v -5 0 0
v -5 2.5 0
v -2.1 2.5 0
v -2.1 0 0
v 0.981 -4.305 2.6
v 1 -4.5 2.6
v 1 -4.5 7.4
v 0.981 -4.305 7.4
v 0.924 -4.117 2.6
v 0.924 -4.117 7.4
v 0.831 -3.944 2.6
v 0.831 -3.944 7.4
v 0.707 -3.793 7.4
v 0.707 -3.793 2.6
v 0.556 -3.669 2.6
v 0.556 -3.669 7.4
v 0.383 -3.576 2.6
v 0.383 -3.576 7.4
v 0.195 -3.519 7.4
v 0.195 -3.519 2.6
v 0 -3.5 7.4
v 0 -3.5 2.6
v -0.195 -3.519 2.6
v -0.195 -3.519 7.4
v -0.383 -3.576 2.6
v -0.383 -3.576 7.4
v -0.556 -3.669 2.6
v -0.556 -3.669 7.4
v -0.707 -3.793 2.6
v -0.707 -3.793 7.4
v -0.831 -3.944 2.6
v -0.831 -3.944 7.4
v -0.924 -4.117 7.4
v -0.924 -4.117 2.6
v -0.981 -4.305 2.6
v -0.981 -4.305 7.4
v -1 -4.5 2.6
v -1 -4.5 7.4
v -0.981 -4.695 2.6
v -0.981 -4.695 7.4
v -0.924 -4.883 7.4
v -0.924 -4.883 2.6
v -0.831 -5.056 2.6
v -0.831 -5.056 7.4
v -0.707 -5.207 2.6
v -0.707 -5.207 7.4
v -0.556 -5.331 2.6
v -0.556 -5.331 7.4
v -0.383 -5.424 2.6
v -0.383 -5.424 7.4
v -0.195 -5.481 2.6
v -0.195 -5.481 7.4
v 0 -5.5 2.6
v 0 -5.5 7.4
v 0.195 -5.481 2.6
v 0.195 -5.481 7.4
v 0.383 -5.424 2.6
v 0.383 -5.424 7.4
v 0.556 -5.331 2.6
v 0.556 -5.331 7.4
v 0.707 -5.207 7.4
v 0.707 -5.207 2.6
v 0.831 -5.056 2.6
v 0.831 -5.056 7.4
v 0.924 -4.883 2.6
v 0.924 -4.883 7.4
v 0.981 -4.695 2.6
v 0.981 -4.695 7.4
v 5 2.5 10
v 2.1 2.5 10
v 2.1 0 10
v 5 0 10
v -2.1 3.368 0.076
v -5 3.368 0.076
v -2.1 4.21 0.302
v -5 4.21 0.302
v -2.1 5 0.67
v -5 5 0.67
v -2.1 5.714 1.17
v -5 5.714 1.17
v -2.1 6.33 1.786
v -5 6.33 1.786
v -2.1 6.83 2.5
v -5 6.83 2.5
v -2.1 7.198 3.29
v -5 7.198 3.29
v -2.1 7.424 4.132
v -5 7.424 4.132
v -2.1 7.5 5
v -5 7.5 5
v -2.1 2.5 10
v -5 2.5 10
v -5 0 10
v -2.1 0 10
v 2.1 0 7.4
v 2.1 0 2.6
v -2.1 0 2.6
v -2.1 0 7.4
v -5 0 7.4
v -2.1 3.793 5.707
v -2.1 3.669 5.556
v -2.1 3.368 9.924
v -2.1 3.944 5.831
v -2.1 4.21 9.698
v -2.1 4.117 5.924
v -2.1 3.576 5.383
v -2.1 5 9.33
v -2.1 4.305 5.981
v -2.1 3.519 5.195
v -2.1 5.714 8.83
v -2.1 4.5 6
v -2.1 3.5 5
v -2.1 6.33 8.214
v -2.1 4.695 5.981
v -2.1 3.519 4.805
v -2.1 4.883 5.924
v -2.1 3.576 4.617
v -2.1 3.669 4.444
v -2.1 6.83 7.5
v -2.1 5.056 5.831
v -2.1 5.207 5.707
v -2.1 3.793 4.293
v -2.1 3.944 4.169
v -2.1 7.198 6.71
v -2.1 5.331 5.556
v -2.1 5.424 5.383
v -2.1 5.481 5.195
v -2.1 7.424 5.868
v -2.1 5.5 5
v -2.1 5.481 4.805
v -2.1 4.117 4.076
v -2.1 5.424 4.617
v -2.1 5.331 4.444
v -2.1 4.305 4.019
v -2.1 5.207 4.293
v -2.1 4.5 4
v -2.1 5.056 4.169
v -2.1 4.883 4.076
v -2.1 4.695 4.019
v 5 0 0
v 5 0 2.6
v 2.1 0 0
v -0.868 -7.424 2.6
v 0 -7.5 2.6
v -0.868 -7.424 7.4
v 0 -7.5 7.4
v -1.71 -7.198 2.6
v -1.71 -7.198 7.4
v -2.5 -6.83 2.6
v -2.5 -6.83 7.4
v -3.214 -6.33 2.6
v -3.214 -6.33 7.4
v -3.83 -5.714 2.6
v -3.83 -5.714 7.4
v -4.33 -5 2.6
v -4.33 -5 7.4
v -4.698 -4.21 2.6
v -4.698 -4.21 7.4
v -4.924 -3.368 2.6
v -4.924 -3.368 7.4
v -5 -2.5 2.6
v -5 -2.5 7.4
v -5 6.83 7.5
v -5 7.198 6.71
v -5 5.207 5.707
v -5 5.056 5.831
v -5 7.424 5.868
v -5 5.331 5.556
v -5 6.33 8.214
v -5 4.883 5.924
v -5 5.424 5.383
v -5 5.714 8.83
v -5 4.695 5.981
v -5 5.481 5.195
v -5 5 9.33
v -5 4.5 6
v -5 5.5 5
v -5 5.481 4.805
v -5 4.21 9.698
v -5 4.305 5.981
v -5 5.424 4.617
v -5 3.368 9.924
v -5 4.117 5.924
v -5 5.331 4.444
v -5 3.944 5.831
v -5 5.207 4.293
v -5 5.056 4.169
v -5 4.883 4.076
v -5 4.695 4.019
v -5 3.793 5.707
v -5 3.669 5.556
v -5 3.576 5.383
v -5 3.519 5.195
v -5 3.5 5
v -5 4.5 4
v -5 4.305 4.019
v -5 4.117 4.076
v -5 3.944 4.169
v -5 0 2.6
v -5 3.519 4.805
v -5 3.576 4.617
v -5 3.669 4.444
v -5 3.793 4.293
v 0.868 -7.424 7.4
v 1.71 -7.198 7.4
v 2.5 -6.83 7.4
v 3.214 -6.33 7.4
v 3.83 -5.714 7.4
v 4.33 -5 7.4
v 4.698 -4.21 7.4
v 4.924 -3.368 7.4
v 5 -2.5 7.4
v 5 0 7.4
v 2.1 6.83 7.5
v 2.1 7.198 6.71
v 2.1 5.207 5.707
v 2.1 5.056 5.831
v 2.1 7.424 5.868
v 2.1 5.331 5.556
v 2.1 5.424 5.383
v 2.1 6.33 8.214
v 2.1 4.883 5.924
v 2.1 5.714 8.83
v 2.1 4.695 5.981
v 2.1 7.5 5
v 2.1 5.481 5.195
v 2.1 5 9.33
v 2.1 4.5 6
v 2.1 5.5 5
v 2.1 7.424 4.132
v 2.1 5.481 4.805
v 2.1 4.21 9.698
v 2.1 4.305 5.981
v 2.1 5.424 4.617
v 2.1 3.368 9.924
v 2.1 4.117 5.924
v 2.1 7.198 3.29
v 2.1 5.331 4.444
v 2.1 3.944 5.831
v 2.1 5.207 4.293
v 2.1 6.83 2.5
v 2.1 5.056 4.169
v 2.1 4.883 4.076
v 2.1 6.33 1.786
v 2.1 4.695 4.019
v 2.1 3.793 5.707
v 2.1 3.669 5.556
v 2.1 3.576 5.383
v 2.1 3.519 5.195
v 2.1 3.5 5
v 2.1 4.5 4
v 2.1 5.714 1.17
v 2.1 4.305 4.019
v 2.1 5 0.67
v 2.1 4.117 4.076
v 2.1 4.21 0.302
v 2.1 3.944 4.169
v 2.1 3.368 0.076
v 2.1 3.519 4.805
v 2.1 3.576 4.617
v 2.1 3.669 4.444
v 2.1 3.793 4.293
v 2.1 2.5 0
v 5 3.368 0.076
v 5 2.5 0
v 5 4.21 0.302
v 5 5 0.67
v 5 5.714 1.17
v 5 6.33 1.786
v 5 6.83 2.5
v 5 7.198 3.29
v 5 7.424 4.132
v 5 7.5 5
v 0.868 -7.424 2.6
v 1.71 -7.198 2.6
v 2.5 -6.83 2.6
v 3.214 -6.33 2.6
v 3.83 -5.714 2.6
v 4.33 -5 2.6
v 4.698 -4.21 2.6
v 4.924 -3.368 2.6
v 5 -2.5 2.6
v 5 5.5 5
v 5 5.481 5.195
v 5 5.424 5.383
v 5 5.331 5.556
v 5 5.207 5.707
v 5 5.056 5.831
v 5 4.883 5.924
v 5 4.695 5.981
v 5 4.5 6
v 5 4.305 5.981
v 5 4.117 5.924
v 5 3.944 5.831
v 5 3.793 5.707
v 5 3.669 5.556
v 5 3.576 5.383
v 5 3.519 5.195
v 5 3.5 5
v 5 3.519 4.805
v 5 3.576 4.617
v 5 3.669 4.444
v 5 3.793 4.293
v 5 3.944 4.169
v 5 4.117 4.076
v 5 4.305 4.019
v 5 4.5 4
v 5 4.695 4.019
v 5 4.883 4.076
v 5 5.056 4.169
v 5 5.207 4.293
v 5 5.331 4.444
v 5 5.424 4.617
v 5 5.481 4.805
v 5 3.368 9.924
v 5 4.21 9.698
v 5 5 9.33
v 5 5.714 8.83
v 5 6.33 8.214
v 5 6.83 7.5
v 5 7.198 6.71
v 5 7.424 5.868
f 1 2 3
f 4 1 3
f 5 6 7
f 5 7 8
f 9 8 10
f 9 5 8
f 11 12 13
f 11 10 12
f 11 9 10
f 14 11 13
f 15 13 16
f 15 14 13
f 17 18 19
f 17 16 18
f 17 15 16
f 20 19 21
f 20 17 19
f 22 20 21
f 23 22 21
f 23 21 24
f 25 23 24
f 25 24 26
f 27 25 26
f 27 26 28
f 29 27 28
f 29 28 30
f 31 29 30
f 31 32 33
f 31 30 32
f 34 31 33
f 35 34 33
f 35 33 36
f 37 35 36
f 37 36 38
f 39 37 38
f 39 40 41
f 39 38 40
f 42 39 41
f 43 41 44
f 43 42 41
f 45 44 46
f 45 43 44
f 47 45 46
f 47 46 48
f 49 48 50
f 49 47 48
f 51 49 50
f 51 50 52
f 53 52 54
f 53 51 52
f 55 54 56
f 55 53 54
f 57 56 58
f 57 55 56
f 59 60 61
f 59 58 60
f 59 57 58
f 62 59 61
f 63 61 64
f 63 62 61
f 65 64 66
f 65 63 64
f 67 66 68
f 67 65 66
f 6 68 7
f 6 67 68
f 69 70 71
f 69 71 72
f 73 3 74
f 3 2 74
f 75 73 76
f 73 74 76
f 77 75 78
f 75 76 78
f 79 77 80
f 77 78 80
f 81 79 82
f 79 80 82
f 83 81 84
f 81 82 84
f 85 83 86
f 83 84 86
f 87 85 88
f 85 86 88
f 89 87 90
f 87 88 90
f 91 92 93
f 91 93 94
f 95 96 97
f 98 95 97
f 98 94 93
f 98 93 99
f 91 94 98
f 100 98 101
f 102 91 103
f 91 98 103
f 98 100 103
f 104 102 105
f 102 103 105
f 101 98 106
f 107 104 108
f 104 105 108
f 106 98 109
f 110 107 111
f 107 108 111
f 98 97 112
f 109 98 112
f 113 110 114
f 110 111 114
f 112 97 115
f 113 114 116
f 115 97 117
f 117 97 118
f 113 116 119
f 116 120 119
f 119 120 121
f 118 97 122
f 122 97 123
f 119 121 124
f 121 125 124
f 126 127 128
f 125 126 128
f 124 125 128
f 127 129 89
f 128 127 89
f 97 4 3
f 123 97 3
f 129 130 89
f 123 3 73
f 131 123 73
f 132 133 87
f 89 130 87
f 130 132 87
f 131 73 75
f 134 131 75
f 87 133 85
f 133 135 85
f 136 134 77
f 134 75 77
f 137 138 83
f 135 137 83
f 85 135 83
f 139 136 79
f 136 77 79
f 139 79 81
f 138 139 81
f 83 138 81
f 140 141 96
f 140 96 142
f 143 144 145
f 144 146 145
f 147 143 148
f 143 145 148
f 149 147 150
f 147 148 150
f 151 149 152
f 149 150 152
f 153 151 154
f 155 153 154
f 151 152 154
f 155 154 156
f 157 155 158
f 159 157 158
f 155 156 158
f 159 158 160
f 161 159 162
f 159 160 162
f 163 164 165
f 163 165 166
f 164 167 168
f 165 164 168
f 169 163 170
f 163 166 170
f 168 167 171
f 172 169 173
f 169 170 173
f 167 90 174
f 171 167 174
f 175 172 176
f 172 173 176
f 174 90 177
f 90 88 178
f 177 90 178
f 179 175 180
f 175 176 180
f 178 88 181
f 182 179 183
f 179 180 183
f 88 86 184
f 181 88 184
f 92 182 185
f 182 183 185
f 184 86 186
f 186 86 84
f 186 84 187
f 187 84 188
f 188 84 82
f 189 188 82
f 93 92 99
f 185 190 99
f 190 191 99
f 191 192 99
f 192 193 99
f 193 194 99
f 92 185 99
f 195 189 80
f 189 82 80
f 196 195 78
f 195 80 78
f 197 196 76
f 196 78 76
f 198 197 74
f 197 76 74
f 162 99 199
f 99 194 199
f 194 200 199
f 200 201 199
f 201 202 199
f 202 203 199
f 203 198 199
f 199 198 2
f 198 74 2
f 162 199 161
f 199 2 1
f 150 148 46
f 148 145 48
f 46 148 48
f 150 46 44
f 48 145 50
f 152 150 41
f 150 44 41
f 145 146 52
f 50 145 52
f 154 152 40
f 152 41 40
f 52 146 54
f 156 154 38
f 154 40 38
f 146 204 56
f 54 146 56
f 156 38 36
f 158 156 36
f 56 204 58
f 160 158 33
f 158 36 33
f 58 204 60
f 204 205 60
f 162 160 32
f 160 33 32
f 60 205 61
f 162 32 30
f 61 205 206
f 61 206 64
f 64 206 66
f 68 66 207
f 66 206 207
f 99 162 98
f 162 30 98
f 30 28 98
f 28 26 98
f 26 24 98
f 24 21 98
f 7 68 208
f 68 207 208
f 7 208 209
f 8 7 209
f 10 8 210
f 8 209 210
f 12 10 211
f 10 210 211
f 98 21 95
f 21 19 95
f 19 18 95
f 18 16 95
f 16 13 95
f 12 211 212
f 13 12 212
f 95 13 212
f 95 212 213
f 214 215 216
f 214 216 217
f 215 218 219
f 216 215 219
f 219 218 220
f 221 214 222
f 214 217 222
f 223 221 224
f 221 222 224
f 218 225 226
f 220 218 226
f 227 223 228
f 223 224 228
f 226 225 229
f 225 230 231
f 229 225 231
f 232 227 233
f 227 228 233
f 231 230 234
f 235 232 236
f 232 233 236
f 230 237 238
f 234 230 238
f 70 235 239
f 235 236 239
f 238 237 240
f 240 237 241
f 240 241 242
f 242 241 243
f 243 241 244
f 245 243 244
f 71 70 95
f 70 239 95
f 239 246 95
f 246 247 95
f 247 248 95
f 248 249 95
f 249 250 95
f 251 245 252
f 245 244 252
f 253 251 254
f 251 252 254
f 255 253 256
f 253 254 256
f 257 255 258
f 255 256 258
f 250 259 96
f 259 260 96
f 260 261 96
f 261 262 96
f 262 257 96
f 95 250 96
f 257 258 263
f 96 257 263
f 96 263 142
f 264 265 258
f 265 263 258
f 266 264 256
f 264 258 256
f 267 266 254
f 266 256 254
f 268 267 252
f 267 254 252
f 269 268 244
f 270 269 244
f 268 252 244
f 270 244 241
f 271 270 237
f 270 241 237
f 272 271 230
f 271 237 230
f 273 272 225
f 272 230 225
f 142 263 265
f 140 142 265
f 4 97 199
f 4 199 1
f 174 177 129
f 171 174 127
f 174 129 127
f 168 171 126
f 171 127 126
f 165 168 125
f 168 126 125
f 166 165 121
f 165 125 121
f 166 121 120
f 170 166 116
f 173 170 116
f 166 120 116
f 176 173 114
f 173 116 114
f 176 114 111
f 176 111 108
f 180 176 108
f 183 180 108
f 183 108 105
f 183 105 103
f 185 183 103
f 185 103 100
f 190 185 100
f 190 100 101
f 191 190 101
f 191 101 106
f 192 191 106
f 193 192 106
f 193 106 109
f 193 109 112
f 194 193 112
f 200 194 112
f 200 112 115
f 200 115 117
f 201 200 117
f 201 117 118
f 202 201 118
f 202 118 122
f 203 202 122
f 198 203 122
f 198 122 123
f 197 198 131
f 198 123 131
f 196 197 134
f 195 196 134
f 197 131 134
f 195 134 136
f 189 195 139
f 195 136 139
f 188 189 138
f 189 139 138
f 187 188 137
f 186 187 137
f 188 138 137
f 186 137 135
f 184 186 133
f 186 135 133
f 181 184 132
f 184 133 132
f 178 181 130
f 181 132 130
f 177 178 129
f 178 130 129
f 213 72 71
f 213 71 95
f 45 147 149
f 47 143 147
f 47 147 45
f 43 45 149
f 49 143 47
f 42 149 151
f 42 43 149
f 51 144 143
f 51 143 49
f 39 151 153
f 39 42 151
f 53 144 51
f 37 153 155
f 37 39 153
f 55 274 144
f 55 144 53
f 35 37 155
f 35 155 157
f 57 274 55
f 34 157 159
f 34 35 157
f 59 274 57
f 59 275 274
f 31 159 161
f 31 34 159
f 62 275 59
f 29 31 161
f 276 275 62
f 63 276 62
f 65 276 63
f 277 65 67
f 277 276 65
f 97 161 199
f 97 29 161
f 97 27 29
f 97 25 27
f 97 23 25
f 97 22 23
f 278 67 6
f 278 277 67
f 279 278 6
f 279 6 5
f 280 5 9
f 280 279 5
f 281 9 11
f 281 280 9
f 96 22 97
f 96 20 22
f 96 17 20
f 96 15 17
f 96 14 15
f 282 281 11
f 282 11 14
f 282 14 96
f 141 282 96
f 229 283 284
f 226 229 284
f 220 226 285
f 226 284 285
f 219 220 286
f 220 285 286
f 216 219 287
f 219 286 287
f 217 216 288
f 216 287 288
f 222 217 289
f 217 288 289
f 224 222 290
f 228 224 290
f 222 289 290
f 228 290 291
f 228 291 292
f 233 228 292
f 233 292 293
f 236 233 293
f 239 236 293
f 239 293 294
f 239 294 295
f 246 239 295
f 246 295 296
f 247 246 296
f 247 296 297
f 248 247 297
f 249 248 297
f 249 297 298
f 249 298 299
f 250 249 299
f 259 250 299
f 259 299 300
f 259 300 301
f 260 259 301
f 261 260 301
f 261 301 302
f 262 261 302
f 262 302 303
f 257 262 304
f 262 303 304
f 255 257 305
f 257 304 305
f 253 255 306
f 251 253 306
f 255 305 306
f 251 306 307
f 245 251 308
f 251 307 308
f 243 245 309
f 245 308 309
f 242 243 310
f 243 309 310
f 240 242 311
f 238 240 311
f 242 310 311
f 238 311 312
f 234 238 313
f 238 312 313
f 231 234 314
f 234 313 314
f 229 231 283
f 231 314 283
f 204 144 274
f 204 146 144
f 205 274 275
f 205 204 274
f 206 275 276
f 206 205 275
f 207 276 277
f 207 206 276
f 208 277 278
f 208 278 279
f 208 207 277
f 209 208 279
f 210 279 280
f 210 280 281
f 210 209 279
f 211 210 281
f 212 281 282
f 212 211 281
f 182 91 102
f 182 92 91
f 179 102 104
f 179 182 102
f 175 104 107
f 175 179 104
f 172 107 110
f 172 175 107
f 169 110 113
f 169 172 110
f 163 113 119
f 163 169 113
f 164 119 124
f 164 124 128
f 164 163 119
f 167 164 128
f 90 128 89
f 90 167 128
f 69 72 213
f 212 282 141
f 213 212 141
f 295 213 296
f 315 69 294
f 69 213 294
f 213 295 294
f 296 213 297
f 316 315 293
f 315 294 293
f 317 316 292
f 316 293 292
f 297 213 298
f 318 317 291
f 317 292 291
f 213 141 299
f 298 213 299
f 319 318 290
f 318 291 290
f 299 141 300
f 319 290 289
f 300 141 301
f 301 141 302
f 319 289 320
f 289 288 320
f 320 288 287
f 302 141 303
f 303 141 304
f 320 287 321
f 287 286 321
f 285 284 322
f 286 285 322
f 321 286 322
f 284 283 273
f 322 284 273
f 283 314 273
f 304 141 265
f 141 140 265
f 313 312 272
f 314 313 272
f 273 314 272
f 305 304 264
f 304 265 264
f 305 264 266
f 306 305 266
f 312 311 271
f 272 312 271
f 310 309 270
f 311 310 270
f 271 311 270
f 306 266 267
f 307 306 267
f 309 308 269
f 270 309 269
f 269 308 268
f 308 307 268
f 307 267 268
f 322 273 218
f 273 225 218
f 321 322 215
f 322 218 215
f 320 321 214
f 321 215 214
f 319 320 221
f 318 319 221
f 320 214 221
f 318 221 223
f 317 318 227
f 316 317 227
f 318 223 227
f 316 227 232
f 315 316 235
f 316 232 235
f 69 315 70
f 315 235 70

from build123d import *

# Parameters (mm, degrees)
SKETCH1_R           = 1
BOSS_EXTRUDE1_DEPTH = 10
SKETCH2_R           = 1
SKETCH2_W           = 2.6
SKETCH2_H           = 7.5
CUT_EXTRUDE1_DEPTH  = 10
FILLET1_R           = 5


with BuildPart() as part:
    # Sketch1 → Boss-Extrude1 (new body)
    with BuildSketch(Plane.XY):
        Polygon((-5, -7.5), (5, -7.5), (5, 7.5), (2.1, 7.5), (2.1, 0), (-2.1, 0), (-2.1, 7.5), (-5, 7.5), align=None)
        with Locations((0, -4.5)):
            Circle(SKETCH1_R, mode=Mode.SUBTRACT)
    extrude(amount=BOSS_EXTRUDE1_DEPTH)

    # Sketch2 → Cut-Extrude1 (cut)
    with BuildSketch(Plane(origin=(5, 0, 0), x_dir=(0, 0, -1), z_dir=(1, 0, 0))):
        with Locations(Location((-5, 4.5, 0), (0, 0, 90))):
            Circle(SKETCH2_R)
        with Locations((-8.7, -3.75)):
            Rectangle(SKETCH2_W, SKETCH2_H)
        with Locations((-1.3, -3.75)):
            Rectangle(SKETCH2_W, SKETCH2_H)
    extrude(amount=-CUT_EXTRUDE1_DEPTH, mode=Mode.SUBTRACT)

    # Fillet1
    fillet1_edges = [part.edges().sort_by_distance(p)[0] for p in [
        (-5, -7.5, 5),
        (5, -7.5, 5),
        (-3.55, 7.5, 0),
        (3.55, 7.5, 0),
        (3.55, 7.5, 10),
        (-3.55, 7.5, 10),
    ]]
    fillet(fillet1_edges, radius=FILLET1_R - 0.0001)  # a hair under: the kernel refuses the full size


solid = part.part
